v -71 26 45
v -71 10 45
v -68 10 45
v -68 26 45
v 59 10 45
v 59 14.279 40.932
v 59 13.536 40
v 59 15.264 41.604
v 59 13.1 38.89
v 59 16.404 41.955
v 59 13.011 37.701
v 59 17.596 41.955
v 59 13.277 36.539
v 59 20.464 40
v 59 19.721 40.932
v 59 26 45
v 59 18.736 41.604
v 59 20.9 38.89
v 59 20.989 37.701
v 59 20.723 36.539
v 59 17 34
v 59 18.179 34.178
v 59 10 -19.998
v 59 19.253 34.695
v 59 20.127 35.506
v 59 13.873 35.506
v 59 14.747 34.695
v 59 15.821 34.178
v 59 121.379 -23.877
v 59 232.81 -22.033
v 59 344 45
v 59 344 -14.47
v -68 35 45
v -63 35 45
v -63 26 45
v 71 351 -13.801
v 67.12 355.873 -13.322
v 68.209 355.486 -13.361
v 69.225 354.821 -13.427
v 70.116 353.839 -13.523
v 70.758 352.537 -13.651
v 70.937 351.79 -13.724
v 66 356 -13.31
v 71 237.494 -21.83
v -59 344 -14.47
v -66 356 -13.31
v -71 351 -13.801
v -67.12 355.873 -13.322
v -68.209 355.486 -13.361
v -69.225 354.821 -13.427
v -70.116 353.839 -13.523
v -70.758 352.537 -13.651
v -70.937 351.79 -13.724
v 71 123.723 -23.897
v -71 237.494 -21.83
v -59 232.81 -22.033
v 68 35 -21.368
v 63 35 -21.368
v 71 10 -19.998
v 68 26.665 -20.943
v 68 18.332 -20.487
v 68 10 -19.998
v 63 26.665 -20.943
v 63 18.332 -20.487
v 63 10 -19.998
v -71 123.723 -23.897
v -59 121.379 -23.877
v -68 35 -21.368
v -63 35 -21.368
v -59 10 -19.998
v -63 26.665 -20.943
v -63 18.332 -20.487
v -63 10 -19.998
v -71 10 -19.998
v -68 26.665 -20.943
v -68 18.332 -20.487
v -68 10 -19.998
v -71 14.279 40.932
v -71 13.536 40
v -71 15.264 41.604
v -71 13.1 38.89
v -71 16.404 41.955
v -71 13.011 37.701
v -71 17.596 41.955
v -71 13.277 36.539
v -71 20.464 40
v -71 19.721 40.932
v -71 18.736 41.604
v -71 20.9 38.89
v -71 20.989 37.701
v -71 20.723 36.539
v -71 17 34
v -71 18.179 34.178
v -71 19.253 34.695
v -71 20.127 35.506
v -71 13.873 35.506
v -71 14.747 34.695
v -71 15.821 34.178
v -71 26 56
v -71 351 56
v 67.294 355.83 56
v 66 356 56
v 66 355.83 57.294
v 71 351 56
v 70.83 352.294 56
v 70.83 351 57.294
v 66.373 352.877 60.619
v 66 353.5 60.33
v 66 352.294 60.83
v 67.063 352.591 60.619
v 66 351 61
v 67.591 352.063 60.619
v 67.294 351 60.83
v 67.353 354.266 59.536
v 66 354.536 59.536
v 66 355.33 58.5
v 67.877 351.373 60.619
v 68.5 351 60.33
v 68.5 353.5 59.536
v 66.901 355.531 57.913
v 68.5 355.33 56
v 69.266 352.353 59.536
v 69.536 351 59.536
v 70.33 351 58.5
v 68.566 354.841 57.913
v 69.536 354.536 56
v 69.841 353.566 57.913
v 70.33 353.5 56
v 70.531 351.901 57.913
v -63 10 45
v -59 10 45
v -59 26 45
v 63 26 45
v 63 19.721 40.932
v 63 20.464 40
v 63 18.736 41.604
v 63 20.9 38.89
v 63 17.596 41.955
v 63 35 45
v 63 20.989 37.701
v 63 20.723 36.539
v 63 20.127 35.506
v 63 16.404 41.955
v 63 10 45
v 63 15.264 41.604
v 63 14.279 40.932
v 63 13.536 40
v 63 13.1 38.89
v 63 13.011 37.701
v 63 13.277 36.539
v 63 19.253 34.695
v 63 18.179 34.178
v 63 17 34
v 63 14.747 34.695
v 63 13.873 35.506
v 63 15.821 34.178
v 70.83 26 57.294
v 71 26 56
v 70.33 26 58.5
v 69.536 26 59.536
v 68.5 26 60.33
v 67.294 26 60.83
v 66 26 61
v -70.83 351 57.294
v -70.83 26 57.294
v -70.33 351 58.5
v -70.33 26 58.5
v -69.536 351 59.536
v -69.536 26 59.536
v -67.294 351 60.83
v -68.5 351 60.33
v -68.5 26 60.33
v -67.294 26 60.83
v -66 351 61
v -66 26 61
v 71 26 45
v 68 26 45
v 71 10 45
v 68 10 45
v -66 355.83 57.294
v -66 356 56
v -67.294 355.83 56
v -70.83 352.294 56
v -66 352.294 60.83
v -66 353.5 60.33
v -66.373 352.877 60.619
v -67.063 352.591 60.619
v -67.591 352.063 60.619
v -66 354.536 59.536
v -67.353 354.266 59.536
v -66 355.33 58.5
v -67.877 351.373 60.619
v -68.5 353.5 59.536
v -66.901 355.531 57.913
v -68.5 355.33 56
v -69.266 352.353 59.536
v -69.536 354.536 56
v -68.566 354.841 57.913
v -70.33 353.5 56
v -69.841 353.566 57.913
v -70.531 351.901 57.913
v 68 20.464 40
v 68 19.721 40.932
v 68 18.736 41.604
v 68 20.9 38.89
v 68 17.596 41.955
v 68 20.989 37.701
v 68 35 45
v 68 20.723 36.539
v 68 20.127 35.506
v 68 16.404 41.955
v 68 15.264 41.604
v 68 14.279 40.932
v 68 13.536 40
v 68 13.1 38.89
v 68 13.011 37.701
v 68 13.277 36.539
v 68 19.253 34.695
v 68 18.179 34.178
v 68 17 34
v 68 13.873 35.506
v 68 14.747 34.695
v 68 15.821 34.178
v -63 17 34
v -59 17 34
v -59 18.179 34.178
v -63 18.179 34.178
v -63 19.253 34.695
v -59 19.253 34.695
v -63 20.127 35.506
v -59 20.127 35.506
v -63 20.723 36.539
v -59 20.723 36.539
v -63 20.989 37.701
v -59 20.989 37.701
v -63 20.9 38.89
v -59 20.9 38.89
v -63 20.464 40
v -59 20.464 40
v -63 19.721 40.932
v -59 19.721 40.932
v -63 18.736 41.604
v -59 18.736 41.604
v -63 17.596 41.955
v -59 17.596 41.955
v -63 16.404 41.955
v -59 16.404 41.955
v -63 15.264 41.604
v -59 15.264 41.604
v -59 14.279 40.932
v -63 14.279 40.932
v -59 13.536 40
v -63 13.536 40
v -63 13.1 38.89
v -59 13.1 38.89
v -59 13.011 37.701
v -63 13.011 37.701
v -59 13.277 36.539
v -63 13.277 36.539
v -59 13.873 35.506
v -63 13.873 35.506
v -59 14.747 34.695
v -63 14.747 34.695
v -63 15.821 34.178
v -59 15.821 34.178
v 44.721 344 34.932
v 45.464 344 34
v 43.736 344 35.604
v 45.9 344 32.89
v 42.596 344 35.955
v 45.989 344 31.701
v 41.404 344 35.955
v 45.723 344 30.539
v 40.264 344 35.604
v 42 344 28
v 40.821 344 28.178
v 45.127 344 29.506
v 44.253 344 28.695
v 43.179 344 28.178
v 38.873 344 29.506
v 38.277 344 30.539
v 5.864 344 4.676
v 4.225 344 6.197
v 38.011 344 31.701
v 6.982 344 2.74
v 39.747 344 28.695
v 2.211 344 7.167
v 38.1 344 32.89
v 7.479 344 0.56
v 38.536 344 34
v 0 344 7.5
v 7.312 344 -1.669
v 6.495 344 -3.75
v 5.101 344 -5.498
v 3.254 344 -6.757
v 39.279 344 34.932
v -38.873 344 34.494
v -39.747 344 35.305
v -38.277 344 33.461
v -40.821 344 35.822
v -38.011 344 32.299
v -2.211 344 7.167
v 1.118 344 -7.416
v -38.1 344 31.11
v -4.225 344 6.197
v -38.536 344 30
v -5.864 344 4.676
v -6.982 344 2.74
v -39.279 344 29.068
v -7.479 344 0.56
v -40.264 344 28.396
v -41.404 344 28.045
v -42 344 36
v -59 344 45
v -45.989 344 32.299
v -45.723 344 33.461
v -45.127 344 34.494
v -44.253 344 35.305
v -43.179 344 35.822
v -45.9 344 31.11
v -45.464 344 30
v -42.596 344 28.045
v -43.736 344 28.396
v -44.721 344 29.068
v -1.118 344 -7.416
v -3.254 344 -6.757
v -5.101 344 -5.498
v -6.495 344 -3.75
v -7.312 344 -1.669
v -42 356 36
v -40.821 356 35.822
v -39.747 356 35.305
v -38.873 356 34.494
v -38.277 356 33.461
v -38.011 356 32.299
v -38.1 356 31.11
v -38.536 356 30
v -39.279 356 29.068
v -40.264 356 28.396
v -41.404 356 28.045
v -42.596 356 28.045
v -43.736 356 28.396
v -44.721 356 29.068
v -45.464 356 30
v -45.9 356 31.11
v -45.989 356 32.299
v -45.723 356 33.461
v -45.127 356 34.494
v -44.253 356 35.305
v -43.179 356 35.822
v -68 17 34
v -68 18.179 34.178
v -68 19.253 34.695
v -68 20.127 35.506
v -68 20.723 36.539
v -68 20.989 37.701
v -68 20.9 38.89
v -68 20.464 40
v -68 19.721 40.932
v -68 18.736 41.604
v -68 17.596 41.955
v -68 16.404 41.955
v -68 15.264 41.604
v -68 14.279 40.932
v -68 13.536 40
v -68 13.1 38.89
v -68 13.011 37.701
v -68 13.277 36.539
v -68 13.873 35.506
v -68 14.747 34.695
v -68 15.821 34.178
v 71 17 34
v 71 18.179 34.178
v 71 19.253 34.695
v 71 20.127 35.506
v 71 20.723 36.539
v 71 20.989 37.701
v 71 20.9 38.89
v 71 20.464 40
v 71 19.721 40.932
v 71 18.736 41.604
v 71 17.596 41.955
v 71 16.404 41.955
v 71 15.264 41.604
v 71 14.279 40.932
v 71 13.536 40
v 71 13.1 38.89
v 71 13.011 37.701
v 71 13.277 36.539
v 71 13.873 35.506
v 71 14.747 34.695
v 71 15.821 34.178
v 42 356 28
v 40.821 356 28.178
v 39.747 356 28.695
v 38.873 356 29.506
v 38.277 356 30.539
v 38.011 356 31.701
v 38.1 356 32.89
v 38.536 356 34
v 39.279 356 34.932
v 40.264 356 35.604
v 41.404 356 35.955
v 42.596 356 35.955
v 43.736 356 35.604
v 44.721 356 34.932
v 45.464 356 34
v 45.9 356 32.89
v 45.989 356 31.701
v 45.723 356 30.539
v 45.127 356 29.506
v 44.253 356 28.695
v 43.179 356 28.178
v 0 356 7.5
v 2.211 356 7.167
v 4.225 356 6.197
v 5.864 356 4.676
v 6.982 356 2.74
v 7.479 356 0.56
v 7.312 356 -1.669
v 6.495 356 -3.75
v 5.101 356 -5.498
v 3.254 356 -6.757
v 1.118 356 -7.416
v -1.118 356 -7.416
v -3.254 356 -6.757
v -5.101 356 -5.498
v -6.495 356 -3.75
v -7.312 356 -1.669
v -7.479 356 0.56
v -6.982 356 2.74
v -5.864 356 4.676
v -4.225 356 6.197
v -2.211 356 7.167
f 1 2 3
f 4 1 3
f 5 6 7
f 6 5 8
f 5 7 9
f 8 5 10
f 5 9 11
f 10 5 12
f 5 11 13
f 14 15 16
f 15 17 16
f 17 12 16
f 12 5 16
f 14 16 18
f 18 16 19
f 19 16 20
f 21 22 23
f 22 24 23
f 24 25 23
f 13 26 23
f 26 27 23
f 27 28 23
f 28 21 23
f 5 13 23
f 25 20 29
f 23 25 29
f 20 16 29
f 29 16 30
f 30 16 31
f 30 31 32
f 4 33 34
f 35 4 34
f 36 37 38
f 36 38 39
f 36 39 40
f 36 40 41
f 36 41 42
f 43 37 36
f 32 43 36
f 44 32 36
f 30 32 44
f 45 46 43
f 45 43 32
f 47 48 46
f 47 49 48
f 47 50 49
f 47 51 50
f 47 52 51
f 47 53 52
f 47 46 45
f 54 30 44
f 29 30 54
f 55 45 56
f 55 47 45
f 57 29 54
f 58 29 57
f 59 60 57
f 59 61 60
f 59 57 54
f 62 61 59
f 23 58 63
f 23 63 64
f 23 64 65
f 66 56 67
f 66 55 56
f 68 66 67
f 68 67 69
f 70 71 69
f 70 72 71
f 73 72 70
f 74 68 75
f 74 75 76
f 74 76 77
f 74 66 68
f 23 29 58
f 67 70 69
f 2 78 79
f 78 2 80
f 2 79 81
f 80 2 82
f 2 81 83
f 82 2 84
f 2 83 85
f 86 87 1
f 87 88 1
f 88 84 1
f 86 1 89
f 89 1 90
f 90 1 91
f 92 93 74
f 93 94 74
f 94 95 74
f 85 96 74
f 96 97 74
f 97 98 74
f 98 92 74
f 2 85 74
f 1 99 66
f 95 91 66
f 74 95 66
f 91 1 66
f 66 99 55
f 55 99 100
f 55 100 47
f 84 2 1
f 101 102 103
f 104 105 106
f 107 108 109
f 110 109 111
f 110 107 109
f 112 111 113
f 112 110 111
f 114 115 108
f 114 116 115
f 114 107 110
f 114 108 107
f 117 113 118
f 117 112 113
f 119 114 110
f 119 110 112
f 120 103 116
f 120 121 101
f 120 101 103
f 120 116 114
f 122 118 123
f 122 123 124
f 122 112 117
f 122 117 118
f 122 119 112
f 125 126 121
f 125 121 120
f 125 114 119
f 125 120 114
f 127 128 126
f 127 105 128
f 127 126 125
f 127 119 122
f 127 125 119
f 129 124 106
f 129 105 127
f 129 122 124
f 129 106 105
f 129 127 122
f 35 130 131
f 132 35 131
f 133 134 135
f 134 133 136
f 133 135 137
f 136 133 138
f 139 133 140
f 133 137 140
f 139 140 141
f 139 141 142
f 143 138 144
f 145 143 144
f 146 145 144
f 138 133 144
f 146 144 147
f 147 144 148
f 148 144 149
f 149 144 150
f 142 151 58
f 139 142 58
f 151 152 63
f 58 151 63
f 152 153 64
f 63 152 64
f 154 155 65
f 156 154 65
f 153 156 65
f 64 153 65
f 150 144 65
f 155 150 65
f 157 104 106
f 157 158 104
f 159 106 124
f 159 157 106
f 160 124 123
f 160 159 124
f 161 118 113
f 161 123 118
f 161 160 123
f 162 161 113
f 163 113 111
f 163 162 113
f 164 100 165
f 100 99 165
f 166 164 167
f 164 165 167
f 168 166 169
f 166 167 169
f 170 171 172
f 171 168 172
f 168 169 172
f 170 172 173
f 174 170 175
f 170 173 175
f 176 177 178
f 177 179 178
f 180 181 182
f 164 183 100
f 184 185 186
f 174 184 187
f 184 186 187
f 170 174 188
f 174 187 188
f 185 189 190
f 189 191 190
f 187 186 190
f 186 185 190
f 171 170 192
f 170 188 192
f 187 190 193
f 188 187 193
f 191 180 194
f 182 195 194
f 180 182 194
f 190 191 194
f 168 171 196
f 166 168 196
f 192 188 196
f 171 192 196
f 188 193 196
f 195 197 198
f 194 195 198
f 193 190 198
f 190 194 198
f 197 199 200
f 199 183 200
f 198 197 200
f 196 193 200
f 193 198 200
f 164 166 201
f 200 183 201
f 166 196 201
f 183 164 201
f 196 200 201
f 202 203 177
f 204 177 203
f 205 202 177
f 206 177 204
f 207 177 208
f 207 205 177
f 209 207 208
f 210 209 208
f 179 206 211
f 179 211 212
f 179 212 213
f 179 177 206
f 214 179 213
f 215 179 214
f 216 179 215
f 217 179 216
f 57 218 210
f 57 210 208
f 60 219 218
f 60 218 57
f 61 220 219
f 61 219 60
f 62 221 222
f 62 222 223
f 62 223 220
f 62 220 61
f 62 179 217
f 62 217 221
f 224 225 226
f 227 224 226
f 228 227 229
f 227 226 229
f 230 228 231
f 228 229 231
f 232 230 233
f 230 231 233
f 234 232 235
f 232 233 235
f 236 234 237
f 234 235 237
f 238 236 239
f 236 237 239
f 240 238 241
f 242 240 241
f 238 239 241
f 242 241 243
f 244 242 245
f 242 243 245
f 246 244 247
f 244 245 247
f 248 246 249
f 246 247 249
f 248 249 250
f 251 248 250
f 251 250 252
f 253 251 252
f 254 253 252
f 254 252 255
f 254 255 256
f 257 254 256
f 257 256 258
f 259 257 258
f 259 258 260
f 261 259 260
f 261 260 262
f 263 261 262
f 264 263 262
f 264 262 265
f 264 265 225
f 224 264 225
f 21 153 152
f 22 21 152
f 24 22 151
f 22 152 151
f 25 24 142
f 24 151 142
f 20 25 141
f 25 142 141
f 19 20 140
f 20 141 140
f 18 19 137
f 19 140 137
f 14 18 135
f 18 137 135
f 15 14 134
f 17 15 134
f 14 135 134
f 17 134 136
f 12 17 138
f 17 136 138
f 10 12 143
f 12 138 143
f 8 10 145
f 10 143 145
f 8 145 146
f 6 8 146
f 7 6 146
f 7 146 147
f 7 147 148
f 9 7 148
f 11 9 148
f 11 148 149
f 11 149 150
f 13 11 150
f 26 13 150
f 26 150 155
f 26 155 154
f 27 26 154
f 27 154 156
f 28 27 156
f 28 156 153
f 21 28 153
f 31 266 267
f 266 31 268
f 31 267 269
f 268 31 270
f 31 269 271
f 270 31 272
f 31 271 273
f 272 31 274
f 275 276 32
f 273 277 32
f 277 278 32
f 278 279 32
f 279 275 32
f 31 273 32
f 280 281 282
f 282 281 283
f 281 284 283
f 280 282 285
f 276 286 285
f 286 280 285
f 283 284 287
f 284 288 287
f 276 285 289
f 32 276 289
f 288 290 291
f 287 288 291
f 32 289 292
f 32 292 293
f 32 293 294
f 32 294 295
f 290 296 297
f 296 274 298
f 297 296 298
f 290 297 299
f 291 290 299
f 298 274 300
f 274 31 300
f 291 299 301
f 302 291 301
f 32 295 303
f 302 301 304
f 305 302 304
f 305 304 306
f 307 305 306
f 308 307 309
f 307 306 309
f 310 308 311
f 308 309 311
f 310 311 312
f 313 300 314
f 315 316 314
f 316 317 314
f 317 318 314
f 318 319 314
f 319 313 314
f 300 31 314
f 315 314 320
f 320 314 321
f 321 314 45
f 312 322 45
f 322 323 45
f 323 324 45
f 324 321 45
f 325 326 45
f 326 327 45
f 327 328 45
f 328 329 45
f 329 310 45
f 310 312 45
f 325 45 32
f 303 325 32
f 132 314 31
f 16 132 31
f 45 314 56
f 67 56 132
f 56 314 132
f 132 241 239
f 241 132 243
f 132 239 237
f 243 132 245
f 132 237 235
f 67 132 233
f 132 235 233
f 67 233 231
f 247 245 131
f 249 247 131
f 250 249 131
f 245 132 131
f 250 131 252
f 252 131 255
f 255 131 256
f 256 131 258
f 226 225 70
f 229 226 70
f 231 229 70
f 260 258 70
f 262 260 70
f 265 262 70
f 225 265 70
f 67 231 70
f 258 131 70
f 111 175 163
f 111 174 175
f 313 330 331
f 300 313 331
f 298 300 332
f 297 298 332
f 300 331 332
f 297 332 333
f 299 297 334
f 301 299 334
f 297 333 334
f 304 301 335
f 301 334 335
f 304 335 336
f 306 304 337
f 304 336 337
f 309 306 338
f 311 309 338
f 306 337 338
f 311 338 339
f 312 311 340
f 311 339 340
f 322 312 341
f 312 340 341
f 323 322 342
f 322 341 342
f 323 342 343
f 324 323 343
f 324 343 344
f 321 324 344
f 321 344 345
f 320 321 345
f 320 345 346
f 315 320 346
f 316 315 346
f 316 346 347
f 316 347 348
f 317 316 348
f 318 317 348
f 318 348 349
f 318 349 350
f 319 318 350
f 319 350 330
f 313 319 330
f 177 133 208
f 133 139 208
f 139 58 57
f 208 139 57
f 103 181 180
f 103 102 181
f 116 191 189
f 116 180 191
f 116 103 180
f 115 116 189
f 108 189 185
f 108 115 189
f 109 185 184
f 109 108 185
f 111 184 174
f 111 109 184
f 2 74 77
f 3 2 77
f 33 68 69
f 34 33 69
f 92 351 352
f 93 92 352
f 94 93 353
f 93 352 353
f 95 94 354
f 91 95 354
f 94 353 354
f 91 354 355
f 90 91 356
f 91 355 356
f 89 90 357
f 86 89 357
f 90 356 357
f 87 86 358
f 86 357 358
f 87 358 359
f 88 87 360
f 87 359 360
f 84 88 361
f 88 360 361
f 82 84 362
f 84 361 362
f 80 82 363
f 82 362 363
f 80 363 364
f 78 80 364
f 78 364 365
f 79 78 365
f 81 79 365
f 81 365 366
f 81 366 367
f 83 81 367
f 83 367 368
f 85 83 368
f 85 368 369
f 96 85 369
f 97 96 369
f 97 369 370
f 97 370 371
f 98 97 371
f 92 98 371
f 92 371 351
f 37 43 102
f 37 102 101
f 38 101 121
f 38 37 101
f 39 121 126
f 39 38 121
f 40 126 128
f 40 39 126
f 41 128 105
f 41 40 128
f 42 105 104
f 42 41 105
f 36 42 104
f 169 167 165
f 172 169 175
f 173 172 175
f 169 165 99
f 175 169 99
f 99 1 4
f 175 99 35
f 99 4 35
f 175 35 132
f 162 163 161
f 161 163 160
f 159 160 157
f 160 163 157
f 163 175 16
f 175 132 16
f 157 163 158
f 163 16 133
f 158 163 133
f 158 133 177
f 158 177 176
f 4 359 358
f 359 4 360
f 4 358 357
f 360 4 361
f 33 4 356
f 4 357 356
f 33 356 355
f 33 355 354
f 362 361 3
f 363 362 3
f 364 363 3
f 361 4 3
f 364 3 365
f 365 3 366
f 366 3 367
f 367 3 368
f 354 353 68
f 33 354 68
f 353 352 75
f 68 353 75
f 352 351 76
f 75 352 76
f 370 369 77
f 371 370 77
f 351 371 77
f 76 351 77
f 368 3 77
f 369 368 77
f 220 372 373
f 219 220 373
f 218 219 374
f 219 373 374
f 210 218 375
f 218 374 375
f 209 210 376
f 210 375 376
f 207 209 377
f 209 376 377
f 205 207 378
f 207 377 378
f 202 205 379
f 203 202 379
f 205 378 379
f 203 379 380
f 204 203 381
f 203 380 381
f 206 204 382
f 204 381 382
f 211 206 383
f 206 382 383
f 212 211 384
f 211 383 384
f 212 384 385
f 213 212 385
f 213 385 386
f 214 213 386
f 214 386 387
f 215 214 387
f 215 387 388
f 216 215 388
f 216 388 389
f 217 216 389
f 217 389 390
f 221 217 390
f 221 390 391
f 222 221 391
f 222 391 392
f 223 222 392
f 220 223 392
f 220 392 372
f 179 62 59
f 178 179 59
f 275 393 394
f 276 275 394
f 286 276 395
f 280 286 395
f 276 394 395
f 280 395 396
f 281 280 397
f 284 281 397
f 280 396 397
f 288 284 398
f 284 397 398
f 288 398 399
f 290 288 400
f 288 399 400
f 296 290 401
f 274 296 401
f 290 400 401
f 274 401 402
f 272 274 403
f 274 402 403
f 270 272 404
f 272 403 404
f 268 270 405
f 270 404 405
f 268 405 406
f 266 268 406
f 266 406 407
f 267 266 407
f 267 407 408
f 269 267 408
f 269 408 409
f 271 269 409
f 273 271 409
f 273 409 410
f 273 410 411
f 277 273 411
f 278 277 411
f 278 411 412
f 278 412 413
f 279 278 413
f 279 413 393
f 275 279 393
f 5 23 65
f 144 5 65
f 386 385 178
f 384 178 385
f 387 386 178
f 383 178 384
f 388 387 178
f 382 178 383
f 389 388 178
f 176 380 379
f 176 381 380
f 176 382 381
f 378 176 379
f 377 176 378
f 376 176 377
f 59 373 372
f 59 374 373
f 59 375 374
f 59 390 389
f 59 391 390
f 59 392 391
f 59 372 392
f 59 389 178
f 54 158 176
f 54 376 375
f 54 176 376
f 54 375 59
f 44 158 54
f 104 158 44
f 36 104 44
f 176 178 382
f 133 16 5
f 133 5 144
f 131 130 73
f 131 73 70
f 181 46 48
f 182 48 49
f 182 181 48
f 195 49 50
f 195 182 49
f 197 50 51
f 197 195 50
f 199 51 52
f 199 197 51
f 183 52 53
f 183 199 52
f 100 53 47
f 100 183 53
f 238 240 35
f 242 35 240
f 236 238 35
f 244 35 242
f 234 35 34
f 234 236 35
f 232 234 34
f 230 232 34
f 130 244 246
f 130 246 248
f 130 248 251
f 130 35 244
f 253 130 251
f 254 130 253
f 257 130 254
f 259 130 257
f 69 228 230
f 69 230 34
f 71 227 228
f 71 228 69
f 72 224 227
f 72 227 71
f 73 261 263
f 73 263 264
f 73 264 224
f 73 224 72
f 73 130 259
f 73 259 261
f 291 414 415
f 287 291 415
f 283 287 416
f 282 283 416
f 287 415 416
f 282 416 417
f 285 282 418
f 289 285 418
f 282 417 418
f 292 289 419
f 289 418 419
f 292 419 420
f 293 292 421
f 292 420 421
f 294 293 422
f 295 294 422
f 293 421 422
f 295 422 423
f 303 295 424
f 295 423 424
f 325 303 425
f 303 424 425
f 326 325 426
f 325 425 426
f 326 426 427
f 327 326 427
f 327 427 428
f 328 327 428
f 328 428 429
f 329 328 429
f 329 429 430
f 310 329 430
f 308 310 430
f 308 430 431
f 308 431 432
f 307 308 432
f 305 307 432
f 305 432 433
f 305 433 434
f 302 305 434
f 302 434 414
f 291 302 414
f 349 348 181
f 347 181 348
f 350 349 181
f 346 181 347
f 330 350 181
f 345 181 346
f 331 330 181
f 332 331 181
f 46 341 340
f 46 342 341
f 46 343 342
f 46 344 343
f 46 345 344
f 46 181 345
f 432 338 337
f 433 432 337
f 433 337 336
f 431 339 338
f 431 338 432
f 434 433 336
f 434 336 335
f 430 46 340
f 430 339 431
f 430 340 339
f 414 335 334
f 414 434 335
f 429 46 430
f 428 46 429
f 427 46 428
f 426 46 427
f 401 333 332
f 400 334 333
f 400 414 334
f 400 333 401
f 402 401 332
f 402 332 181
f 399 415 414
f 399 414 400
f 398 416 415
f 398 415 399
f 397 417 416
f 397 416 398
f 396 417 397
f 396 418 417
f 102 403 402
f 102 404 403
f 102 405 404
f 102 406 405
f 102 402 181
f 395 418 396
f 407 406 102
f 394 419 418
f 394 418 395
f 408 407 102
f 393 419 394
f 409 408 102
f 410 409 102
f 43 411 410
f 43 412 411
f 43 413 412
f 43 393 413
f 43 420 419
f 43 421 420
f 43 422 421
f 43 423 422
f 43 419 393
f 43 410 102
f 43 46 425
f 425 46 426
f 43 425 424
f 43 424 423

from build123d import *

# Parameters (mm, degrees)
CUT_EXTRUDE1_DEPTH      = 10
CUT_EXTRUDE1_DEPTH_BACK = 10
SKETCH7_W               = 161.67088451347962
SKETCH7_H               = 99.40268669666085
SKETCH8_W               = 4.999999999999993
SKETCH8_H               = 94
CUT_EXTRUDE2_DEPTH      = 35
SKETCH9_R               = 7.5
SKETCH9_R_2             = 4.000000000000013
SKETCH9_R_3             = 4.000000000000005
CUT_EXTRUDE3_DEPTH      = 357.06460088023357
SKETCH10_R              = 4.000000000000005
CUT_EXTRUDE4_DEPTH      = 386.9080201291493
SKETCH11_W              = 141.9999999999999
SKETCH11_H              = 16
BOSS_EXTRUDE1_DEPTH     = 330
FILLET2_R               = 5
FILLET3_R               = 5
FILLET4_R               = 5
FILLET5_R               = 5
FILLET6_R               = 5
CUT_EXTRUDE5_DEPTH      = 389.0992141192763


with BuildPart() as part:
    # Sweep2: sweep along a path in Sketch4
    with BuildLine(Plane.XY) as sweep2_path:
        Line((-65, 350), (-64.99999999999994, 10.000000000000007))
        ThreePointArc((-64.99999999999994, 10.000000000000007), (-62.07106781186544, 2.928932188134527), (-54.99999999999996, 0))
        Line((-54.99999999999996, 0), (54.99999999999999, 0))
        ThreePointArc((54.99999999999999, 0), (62.071067811865476, 2.9289321881345227), (65, 10))
        Line((65, 10), (65, 350))
        Line((65, 350), (-65, 350))
    # Sketch6 → Sweep2 (sweep)
    with BuildSketch(Plane(origin=(0, 0, 0), x_dir=(0, 0, -1), z_dir=(1, 0, 0))):
        Polygon((45.00000000000006, 355.99999999999994), (-44.999999999999936, 355.99999999999994), (-44.999999999999936, 343.99999999999994), (45.000000000000064, 344), align=None)
    sweep(path=sweep2_path.line, transition=Transition.RIGHT)

    # Sketch7 → Cut-Extrude1 (cut, two sides: drawn at the far end of the back side and taken through both)
    with BuildSketch(Plane(origin=(0, 0, 0), x_dir=(1, 0, 0), z_dir=(0, 1, 0)).offset(-CUT_EXTRUDE1_DEPTH_BACK)):
        Rectangle(SKETCH7_W, SKETCH7_H)
    extrude(amount=CUT_EXTRUDE1_DEPTH + CUT_EXTRUDE1_DEPTH_BACK, mode=Mode.SUBTRACT)

    # Sketch8 → Cut-Extrude2 (cut)
    with BuildSketch(Plane(origin=(0, 0, 0), x_dir=(1, 0, 0), z_dir=(0, 1, 0))):
        with Locations((-65.5, 0.24224418482823395)):
            Rectangle(SKETCH8_W, SKETCH8_H)
        with Locations((65.5, 0.24224418482823395)):
            Rectangle(SKETCH8_W, SKETCH8_H)
    extrude(amount=CUT_EXTRUDE2_DEPTH, mode=Mode.SUBTRACT)

    # Sketch9 → Cut-Extrude3 (cut, through all)
    with BuildSketch(Plane(origin=(0, 355.99999999999994, 0), x_dir=(1, 0, 0), z_dir=(0, 1, 0))):
        with Locations(Location((0, 0, 0), (0, 0, 270))):
            Circle(SKETCH9_R)
        with Locations(Location((-42, 31.999999999999993, 0), (0, 0, 270))):
            Circle(SKETCH9_R_2)
        with Locations(Location((-42, -32.00000000000001, 0), (0, 0, 270))):
            Circle(SKETCH9_R_3)
        with Locations(Location((42, -31.999999999999954, 0), (0, 0, 90))):
            Circle(SKETCH9_R_3)
        with Locations(Location((42, 32, 0), (0, 0, 90))):
            Circle(SKETCH9_R_2)
    extrude(amount=-CUT_EXTRUDE3_DEPTH, mode=Mode.SUBTRACT)

    # Sketch10 → Cut-Extrude4 (cut, through all)
    with BuildSketch(Plane(origin=(70.99999999999996, 0, 0), x_dir=(0, 0, -1), z_dir=(1, 0, 0))):
        with Locations((-37.999999999999936, 17.000000000000014)):
            Circle(SKETCH10_R)
    extrude(amount=-CUT_EXTRUDE4_DEPTH, mode=Mode.SUBTRACT)

    # Sketch11 → Boss-Extrude1 (add)
    with BuildSketch(Plane(origin=(0, 355.99999999999994, 0), x_dir=(1, 0, 0), z_dir=(0, 1, 0))):
        with Locations((0, -52.999999999999936)):
            Rectangle(SKETCH11_W, SKETCH11_H)
    extrude(amount=-BOSS_EXTRUDE1_DEPTH)

    # Fillet2
    fillet2_edges = [part.edges().sort_by_distance(p)[0] for p in [
        (59.00000000000001, 177, -45.000000000000064),
    ]]
    fillet(fillet2_edges, radius=FILLET2_R)

    # Fillet3
    fillet3_edges = [part.edges().sort_by_distance(p)[0] for p in [
        (70.99999999999994, 182.99999999999997, -45.00000000000005),
    ]]
    fillet(fillet3_edges, radius=FILLET3_R)

    # Fillet4
    fillet4_edges = [part.edges().sort_by_distance(p)[0] for p in [
        (-59.00000000000001, 177, -45.000000000000064),
    ]]
    fillet(fillet4_edges, radius=FILLET4_R)

    # Fillet5
    fillet5_edges = [part.edges().sort_by_distance(p)[0] for p in [
        (-70.99999999999994, 182.99999999999997, -45.00000000000005),
    ]]
    fillet(fillet5_edges, radius=FILLET5_R)

    # Fillet6
    fillet6_edges = [part.edges().sort_by_distance(p)[0] for p in [
        (70.99999999999994, 355.99999999999994, 10.499999999999893),
        (69.53553390593268, 355.9999999999999, -43.535533905932894),
        (0, 355.99999999999994, -45.00000000000005),
        (0, 355.99999999999994, -45.00000000000005),
        (-69.53553390593268, 355.99999999999994, -43.535533905932795),
        (-70.99999999999994, 355.99999999999994, 10.499999999999936),
        (0, 355.99999999999994, 60.999999999999936),
        (-70.99999999999994, 190.99999999999994, 60.999999999999936),
        (70.99999999999994, 190.99999999999994, 60.999999999999936),
    ]]
    fillet(fillet6_edges, radius=FILLET6_R)

    # Sketch12 → Cut-Extrude5 (cut, through all)
    with BuildSketch(Plane.ZY.offset(70.9999999999999)):
        with BuildLine():
            Line((-19.99811023879916, 9.999999999999995), (-79.77303285275339, 10.000000000000018))
            Line((-79.77303285275339, 10.000000000000018), (-79.77303285275339, 406.4421165391139))
            Line((-79.77303285275339, 406.4421165391139), (-12.883579031367276, 360.2403098799698))
            ThreePointArc((-12.883579031367276, 360.2403098799698), (-23.51999666611846, 185.26395577223084), (-19.99811023879916, 9.999999999999995))
        make_face()
    extrude(amount=-CUT_EXTRUDE5_DEPTH, mode=Mode.SUBTRACT)


solid = part.part
